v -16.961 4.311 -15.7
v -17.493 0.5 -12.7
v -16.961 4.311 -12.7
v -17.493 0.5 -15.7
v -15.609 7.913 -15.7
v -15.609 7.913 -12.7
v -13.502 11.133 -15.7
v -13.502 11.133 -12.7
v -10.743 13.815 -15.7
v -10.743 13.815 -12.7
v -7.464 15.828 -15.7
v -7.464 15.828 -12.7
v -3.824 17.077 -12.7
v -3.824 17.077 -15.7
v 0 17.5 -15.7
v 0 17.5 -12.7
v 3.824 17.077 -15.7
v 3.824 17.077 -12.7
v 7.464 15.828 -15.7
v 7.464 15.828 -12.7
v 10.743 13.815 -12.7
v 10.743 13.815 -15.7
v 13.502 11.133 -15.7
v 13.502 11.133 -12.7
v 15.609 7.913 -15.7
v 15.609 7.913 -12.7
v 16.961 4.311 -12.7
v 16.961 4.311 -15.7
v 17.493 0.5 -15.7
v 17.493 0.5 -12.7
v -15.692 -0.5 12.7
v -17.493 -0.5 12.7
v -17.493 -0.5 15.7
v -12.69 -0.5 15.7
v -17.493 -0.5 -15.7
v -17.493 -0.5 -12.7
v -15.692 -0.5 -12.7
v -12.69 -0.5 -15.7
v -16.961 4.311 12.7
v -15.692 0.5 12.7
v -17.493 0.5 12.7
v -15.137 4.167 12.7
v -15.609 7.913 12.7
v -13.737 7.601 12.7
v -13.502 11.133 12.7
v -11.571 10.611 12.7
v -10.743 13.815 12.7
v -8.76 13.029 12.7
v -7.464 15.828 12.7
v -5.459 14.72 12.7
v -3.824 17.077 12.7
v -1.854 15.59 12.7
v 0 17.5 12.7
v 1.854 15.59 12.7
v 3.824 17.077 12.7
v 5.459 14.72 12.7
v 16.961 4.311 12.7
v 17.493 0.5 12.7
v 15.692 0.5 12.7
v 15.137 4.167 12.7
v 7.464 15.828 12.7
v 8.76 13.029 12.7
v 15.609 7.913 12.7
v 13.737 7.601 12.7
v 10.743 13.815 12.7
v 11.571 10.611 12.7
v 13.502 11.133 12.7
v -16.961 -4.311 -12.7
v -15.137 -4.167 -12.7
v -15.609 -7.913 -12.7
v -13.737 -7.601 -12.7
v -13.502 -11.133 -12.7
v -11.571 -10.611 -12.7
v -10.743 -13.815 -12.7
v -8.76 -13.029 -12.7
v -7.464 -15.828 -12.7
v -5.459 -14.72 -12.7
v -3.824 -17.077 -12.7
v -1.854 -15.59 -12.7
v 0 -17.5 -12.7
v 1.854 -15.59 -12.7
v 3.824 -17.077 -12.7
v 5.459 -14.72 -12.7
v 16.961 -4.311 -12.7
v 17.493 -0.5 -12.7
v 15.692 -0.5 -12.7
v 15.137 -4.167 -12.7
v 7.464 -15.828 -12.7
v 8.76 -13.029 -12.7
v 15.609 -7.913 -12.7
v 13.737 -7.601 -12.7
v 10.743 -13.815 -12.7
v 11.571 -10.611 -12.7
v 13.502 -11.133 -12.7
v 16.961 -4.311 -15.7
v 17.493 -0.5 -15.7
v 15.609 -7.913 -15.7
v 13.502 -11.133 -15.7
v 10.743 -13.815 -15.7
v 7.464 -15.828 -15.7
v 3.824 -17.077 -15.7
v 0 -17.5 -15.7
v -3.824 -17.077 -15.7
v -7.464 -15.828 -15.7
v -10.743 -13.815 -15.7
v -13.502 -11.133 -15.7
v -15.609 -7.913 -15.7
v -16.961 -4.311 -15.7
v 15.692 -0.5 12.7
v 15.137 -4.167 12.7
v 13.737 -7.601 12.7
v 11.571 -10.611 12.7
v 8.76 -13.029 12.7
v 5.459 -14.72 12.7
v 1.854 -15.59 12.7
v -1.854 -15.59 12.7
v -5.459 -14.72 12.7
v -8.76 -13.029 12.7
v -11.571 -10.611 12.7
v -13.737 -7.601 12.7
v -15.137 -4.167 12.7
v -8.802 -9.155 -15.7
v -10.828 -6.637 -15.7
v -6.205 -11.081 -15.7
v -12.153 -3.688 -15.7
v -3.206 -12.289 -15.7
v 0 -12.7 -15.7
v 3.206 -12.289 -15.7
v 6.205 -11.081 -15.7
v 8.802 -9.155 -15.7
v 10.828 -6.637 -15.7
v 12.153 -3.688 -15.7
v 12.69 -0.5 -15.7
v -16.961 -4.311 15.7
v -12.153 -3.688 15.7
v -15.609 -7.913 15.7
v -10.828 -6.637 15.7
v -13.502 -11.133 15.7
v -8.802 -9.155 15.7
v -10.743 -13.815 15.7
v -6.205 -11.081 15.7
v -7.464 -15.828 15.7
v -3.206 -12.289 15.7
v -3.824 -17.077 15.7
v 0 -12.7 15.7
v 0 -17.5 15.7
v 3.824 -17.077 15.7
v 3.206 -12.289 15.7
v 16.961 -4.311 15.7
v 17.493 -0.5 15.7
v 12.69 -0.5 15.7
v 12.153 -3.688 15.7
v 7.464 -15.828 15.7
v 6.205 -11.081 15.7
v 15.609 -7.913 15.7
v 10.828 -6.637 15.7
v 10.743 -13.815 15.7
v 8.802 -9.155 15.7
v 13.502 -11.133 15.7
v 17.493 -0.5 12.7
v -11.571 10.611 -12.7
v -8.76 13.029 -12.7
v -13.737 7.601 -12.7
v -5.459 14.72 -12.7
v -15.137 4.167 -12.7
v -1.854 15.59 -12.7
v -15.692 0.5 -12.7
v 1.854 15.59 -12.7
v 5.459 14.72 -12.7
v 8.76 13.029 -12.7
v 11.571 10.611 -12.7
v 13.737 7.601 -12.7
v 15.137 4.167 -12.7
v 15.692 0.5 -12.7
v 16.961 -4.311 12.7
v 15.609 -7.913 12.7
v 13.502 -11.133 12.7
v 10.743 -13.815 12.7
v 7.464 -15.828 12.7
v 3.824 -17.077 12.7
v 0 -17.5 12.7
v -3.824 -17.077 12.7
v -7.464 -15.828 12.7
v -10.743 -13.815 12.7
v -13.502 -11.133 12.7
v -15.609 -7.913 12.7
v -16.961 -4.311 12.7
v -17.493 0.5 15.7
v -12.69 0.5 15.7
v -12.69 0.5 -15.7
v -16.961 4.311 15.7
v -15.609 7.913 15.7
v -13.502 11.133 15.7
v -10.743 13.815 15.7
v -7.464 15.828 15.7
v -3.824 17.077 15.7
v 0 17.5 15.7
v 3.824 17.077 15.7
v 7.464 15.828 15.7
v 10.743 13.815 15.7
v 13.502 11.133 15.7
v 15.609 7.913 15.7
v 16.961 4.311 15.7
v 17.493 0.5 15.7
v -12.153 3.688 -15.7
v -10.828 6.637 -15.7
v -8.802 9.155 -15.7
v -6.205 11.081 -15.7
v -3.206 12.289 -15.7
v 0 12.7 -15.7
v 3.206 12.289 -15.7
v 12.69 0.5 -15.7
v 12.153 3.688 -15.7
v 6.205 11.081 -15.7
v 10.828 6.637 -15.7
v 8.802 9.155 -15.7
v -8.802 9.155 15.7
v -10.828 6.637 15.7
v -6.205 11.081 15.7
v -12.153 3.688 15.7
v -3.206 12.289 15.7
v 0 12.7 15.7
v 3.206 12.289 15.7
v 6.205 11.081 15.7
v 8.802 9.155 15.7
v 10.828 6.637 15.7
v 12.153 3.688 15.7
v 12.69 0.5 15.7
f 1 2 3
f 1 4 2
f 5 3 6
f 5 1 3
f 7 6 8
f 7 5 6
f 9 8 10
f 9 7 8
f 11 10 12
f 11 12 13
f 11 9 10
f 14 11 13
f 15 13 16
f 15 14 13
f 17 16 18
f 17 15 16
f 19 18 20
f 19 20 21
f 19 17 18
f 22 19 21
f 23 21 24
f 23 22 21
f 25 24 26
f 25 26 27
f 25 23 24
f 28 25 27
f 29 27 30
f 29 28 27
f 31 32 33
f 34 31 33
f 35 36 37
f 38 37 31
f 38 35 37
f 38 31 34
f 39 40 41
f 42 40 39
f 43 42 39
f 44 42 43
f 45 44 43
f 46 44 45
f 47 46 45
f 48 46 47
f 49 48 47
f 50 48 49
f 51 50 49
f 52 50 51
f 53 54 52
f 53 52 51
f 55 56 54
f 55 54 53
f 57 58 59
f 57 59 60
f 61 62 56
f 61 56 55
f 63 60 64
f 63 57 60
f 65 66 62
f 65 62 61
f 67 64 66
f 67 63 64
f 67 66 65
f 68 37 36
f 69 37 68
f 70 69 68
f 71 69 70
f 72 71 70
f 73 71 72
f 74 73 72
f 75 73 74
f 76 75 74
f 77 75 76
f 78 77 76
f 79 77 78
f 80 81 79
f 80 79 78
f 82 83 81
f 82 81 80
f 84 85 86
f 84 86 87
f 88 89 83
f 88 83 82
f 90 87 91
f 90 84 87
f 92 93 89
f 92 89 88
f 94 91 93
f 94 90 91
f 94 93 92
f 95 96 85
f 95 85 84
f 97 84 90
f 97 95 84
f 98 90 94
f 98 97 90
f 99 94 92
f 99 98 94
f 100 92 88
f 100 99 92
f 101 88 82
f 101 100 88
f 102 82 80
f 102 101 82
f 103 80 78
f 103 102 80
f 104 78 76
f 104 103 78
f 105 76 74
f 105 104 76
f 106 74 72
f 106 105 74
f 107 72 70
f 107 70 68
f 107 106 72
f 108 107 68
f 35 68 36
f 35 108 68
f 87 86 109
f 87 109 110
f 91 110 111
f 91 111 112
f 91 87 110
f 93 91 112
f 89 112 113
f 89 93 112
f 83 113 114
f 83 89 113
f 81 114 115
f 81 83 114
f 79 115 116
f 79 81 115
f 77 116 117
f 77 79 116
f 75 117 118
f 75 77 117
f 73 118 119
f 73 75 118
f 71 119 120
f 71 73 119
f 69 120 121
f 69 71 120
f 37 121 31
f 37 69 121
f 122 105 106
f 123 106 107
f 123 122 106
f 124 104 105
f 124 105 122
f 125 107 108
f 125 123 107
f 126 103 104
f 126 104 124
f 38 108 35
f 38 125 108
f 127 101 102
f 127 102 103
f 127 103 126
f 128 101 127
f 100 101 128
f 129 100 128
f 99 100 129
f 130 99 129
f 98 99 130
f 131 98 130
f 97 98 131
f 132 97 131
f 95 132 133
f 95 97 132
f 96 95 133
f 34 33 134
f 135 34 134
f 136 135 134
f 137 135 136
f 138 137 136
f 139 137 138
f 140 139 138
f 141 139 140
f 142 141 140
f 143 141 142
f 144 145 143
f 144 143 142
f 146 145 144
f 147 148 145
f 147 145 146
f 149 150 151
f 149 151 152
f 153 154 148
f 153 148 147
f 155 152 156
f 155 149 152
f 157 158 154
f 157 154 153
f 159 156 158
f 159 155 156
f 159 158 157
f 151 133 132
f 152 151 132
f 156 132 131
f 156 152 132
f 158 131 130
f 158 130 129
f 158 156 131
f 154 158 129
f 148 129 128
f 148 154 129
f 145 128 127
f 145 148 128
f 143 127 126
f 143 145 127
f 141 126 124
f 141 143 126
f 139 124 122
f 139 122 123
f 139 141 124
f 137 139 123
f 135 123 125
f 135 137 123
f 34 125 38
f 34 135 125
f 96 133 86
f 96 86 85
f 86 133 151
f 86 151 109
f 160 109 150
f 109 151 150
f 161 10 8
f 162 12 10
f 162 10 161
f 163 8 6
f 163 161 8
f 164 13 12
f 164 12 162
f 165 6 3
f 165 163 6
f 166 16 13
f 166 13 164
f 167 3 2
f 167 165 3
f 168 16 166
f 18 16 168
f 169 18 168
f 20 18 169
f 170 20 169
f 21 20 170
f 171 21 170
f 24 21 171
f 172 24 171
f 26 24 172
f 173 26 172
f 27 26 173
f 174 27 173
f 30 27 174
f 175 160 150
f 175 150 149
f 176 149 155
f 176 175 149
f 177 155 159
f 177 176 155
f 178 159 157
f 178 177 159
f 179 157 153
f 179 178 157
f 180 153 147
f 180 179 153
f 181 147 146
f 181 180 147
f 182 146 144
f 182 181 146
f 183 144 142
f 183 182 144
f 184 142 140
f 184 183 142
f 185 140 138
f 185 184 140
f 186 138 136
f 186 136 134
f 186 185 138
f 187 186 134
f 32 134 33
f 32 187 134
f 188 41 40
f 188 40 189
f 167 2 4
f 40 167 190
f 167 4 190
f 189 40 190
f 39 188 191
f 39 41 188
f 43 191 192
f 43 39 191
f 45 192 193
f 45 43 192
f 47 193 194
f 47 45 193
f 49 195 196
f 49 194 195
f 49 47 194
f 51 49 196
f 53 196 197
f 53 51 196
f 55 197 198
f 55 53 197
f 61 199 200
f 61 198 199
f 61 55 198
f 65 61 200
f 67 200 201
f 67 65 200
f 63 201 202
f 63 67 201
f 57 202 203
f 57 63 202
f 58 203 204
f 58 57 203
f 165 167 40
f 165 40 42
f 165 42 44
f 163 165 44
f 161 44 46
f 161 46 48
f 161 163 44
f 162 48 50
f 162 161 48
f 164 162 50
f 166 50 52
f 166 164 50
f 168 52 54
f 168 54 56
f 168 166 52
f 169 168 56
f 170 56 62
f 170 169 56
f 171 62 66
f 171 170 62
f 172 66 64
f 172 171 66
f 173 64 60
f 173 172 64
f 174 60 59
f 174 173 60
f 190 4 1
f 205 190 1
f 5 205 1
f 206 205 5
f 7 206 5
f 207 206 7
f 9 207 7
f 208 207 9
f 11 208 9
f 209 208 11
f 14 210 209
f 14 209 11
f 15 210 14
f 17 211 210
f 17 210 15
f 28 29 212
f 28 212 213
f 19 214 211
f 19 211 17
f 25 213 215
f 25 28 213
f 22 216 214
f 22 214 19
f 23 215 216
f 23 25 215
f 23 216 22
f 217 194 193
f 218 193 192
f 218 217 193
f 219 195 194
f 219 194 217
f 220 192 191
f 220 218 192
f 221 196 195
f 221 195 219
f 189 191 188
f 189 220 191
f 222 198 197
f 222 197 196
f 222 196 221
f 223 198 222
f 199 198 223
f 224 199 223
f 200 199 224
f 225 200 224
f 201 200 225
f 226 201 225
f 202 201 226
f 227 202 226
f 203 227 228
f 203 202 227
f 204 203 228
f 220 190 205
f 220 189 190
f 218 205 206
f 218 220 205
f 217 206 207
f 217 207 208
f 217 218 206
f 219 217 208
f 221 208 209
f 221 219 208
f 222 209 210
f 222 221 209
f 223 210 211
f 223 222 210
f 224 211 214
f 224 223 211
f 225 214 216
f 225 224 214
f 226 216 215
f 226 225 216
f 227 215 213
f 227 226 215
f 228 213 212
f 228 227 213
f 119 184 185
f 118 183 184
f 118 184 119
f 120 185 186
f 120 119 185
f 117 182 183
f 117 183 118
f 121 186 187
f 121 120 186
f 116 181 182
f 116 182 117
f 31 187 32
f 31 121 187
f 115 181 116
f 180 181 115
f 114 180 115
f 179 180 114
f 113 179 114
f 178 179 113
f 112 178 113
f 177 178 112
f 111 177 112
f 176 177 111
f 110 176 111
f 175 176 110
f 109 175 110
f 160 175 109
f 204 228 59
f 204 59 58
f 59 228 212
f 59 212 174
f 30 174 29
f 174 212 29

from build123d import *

# Parameters (mm, degrees)
SKETCH2_W               = 42.06954519
SKETCH2_H               = 1
CUT_EXTRUDE1_DEPTH      = 16.7
CUT_EXTRUDE1_DEPTH_BACK = 16.7


with BuildPart() as part:
    # Sketch1 → Revolve1 (revolve)
    with BuildSketch(Plane(origin=(0, 0, 0), x_dir=(0, 0, -1), z_dir=(1, 0, 0))):
        Polygon((-15.7, 12.7), (-15.7, 17.5), (-12.7, 17.5), (-12.7, 15.7), (12.7, 15.7), (12.7, 17.5), (15.7, 17.5), (15.7, 12.7), align=None)
    revolve(axis=Axis((0, 0, 67.856305953), (0, 0, -1)))

    # Sketch2 → Cut-Extrude1 (cut, two sides)
    with BuildSketch(Plane.XY) as cut_extrude1_sk:
        Rectangle(SKETCH2_W, SKETCH2_H)
    extrude(amount=CUT_EXTRUDE1_DEPTH, mode=Mode.SUBTRACT)
    extrude(cut_extrude1_sk.sketch, amount=-CUT_EXTRUDE1_DEPTH_BACK, mode=Mode.SUBTRACT)


solid = part.part
